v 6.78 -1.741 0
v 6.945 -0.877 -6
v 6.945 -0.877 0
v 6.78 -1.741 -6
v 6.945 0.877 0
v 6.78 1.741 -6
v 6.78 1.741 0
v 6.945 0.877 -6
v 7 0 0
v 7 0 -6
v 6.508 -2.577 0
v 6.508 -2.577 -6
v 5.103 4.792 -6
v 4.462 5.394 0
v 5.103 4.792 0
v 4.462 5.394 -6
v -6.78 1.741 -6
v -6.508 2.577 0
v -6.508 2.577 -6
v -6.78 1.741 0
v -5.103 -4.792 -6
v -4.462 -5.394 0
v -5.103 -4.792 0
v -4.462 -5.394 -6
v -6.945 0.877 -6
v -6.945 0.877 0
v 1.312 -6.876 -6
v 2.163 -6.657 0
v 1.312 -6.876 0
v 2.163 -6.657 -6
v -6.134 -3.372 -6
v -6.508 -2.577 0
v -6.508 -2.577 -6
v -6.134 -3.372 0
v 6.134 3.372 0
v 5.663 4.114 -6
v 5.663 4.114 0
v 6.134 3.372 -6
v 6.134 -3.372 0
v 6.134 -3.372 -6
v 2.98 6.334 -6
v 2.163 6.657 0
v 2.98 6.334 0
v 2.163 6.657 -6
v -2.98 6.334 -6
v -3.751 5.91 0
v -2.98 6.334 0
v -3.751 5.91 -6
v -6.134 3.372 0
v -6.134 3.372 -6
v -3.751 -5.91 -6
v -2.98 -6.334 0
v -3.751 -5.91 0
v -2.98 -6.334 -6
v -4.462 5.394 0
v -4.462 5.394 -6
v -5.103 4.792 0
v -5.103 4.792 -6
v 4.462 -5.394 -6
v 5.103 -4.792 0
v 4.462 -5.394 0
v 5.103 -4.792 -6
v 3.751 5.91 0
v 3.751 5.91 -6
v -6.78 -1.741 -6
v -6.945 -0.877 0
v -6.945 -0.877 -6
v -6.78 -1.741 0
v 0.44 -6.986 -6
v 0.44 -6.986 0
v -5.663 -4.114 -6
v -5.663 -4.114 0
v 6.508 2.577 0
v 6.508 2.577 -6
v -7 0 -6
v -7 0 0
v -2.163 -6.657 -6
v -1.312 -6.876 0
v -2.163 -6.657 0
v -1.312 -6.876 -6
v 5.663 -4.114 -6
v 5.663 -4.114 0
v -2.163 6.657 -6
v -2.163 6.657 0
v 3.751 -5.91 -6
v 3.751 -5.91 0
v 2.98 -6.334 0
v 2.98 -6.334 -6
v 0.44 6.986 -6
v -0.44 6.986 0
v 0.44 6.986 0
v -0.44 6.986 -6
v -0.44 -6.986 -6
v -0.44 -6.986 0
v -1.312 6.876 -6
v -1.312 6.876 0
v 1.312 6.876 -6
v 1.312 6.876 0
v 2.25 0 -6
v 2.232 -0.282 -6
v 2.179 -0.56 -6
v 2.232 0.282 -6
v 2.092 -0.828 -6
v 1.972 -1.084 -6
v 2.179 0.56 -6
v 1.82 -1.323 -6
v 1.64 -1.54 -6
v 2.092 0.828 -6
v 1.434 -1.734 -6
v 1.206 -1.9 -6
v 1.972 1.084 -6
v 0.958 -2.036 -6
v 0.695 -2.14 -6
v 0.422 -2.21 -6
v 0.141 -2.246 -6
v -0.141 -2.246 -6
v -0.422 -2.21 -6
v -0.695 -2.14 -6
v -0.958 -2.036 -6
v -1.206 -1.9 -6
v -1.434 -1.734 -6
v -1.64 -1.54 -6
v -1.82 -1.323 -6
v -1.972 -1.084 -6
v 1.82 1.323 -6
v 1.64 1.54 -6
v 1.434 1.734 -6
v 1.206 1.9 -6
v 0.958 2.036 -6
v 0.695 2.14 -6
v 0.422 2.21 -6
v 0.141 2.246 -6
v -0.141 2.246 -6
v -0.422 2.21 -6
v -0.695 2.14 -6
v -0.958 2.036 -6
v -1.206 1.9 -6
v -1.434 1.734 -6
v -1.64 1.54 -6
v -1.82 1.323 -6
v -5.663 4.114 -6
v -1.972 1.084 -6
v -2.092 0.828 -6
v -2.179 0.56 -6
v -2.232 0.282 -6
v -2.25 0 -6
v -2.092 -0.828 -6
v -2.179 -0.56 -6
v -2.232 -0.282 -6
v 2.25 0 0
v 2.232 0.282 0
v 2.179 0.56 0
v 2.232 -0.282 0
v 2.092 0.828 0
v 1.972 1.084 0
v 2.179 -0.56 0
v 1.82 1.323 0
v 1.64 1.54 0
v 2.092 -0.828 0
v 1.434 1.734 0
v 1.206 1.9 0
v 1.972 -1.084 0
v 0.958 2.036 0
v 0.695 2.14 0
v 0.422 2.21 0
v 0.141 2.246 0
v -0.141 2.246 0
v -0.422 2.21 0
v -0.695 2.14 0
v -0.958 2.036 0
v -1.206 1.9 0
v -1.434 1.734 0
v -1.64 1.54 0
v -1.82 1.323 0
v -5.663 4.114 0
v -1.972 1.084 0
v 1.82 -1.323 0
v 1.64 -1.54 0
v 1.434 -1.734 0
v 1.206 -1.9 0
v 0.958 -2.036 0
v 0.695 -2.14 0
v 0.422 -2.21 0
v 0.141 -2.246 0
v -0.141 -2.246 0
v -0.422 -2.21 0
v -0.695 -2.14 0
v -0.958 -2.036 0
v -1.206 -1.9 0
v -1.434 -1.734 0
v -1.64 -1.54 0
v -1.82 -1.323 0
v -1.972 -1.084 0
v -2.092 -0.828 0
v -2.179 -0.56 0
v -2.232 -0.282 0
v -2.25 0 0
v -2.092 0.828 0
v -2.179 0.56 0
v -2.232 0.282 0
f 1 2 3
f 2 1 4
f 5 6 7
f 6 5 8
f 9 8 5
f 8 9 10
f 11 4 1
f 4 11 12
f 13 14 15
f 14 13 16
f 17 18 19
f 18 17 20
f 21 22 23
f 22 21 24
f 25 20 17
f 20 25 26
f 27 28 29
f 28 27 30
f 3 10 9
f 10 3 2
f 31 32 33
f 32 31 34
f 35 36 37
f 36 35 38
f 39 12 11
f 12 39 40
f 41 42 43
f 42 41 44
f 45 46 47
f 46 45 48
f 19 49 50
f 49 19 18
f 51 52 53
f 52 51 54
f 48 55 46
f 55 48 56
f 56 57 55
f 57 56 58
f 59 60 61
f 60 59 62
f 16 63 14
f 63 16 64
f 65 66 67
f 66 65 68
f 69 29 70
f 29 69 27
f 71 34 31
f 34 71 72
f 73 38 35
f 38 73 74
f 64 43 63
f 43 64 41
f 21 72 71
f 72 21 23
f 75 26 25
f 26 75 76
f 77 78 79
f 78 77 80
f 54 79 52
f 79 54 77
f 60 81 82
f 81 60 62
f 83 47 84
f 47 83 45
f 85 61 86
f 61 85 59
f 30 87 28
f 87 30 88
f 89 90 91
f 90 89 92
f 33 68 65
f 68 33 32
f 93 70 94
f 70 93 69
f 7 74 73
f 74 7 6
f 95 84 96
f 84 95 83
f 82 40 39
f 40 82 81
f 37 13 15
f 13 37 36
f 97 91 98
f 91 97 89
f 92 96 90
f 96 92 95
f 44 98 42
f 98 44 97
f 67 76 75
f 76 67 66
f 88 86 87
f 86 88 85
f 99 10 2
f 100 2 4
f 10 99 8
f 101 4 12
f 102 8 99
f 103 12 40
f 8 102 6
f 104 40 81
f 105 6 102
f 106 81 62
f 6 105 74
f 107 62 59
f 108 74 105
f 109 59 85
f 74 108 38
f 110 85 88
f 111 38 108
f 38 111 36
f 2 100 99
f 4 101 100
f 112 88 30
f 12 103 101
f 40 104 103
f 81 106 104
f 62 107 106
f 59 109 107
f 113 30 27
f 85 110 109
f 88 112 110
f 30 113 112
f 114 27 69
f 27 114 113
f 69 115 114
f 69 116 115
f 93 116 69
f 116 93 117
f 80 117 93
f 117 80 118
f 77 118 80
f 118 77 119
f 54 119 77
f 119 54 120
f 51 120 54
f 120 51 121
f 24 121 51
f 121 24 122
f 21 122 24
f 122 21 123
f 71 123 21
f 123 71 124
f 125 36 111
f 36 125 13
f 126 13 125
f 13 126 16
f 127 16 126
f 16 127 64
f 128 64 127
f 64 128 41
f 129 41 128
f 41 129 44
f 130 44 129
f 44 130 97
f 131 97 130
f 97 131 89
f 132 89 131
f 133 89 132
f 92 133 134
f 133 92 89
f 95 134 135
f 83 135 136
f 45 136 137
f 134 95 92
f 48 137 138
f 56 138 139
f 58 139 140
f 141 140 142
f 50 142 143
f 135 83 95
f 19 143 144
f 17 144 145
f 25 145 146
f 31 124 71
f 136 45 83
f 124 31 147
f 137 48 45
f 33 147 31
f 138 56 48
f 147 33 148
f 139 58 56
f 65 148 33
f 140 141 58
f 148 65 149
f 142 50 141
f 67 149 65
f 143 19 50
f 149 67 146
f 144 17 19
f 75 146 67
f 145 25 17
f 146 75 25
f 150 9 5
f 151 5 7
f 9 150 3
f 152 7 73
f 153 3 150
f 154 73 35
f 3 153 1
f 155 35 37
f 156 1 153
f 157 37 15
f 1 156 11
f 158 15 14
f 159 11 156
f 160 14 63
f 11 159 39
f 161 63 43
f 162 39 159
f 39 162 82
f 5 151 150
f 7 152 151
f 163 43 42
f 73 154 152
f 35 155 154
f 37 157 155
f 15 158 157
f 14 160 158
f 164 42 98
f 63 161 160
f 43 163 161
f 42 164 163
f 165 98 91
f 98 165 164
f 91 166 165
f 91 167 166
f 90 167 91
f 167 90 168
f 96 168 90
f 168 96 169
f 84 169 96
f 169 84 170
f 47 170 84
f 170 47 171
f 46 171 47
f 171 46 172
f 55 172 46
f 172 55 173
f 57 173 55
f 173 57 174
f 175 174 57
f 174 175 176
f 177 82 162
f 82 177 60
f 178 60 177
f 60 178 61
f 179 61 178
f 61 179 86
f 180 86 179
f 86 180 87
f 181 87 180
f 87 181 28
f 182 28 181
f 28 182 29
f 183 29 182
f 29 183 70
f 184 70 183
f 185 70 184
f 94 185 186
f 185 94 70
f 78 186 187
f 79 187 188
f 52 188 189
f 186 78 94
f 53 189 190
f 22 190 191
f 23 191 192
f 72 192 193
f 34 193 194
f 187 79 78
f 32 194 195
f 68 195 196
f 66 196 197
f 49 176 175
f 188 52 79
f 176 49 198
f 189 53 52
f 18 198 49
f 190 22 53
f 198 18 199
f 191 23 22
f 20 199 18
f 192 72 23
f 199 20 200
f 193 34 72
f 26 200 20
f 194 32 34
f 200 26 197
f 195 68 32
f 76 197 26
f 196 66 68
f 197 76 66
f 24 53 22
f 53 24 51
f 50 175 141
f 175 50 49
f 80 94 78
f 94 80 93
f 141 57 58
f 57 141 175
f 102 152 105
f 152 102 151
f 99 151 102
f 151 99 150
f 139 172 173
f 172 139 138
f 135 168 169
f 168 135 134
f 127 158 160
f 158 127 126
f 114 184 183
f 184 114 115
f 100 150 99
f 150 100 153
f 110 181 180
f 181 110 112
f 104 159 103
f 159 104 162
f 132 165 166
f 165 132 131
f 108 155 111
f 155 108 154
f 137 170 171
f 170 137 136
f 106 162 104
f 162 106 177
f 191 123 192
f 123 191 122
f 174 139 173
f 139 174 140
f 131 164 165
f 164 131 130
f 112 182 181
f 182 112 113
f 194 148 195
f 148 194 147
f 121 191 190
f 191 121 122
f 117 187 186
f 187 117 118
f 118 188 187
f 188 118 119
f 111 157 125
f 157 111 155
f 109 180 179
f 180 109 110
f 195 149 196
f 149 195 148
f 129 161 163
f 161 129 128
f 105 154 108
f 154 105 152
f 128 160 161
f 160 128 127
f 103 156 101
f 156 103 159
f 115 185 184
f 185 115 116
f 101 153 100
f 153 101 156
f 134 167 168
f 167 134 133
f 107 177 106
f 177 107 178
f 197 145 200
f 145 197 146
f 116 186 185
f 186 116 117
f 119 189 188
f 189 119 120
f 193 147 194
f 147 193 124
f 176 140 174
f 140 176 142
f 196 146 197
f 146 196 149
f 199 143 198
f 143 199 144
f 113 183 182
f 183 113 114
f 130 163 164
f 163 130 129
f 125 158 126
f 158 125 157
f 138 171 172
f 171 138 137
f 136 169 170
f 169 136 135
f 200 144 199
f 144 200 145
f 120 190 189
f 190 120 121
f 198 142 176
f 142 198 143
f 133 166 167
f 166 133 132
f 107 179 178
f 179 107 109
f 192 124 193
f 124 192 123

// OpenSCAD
$fn = 50;


difference() {
	union() {
		translate(v = [0, 0, -6.0000000000]) {
			cylinder(h = 6, r = 7.0000000000);
		}
		cylinder(h = 0, r = 17.0000000000);
	}
	union() {
		#translate(v = [0, 0, -6]) {
			cylinder(h = 6, r = 2.2500000000);
		}
	}
}
